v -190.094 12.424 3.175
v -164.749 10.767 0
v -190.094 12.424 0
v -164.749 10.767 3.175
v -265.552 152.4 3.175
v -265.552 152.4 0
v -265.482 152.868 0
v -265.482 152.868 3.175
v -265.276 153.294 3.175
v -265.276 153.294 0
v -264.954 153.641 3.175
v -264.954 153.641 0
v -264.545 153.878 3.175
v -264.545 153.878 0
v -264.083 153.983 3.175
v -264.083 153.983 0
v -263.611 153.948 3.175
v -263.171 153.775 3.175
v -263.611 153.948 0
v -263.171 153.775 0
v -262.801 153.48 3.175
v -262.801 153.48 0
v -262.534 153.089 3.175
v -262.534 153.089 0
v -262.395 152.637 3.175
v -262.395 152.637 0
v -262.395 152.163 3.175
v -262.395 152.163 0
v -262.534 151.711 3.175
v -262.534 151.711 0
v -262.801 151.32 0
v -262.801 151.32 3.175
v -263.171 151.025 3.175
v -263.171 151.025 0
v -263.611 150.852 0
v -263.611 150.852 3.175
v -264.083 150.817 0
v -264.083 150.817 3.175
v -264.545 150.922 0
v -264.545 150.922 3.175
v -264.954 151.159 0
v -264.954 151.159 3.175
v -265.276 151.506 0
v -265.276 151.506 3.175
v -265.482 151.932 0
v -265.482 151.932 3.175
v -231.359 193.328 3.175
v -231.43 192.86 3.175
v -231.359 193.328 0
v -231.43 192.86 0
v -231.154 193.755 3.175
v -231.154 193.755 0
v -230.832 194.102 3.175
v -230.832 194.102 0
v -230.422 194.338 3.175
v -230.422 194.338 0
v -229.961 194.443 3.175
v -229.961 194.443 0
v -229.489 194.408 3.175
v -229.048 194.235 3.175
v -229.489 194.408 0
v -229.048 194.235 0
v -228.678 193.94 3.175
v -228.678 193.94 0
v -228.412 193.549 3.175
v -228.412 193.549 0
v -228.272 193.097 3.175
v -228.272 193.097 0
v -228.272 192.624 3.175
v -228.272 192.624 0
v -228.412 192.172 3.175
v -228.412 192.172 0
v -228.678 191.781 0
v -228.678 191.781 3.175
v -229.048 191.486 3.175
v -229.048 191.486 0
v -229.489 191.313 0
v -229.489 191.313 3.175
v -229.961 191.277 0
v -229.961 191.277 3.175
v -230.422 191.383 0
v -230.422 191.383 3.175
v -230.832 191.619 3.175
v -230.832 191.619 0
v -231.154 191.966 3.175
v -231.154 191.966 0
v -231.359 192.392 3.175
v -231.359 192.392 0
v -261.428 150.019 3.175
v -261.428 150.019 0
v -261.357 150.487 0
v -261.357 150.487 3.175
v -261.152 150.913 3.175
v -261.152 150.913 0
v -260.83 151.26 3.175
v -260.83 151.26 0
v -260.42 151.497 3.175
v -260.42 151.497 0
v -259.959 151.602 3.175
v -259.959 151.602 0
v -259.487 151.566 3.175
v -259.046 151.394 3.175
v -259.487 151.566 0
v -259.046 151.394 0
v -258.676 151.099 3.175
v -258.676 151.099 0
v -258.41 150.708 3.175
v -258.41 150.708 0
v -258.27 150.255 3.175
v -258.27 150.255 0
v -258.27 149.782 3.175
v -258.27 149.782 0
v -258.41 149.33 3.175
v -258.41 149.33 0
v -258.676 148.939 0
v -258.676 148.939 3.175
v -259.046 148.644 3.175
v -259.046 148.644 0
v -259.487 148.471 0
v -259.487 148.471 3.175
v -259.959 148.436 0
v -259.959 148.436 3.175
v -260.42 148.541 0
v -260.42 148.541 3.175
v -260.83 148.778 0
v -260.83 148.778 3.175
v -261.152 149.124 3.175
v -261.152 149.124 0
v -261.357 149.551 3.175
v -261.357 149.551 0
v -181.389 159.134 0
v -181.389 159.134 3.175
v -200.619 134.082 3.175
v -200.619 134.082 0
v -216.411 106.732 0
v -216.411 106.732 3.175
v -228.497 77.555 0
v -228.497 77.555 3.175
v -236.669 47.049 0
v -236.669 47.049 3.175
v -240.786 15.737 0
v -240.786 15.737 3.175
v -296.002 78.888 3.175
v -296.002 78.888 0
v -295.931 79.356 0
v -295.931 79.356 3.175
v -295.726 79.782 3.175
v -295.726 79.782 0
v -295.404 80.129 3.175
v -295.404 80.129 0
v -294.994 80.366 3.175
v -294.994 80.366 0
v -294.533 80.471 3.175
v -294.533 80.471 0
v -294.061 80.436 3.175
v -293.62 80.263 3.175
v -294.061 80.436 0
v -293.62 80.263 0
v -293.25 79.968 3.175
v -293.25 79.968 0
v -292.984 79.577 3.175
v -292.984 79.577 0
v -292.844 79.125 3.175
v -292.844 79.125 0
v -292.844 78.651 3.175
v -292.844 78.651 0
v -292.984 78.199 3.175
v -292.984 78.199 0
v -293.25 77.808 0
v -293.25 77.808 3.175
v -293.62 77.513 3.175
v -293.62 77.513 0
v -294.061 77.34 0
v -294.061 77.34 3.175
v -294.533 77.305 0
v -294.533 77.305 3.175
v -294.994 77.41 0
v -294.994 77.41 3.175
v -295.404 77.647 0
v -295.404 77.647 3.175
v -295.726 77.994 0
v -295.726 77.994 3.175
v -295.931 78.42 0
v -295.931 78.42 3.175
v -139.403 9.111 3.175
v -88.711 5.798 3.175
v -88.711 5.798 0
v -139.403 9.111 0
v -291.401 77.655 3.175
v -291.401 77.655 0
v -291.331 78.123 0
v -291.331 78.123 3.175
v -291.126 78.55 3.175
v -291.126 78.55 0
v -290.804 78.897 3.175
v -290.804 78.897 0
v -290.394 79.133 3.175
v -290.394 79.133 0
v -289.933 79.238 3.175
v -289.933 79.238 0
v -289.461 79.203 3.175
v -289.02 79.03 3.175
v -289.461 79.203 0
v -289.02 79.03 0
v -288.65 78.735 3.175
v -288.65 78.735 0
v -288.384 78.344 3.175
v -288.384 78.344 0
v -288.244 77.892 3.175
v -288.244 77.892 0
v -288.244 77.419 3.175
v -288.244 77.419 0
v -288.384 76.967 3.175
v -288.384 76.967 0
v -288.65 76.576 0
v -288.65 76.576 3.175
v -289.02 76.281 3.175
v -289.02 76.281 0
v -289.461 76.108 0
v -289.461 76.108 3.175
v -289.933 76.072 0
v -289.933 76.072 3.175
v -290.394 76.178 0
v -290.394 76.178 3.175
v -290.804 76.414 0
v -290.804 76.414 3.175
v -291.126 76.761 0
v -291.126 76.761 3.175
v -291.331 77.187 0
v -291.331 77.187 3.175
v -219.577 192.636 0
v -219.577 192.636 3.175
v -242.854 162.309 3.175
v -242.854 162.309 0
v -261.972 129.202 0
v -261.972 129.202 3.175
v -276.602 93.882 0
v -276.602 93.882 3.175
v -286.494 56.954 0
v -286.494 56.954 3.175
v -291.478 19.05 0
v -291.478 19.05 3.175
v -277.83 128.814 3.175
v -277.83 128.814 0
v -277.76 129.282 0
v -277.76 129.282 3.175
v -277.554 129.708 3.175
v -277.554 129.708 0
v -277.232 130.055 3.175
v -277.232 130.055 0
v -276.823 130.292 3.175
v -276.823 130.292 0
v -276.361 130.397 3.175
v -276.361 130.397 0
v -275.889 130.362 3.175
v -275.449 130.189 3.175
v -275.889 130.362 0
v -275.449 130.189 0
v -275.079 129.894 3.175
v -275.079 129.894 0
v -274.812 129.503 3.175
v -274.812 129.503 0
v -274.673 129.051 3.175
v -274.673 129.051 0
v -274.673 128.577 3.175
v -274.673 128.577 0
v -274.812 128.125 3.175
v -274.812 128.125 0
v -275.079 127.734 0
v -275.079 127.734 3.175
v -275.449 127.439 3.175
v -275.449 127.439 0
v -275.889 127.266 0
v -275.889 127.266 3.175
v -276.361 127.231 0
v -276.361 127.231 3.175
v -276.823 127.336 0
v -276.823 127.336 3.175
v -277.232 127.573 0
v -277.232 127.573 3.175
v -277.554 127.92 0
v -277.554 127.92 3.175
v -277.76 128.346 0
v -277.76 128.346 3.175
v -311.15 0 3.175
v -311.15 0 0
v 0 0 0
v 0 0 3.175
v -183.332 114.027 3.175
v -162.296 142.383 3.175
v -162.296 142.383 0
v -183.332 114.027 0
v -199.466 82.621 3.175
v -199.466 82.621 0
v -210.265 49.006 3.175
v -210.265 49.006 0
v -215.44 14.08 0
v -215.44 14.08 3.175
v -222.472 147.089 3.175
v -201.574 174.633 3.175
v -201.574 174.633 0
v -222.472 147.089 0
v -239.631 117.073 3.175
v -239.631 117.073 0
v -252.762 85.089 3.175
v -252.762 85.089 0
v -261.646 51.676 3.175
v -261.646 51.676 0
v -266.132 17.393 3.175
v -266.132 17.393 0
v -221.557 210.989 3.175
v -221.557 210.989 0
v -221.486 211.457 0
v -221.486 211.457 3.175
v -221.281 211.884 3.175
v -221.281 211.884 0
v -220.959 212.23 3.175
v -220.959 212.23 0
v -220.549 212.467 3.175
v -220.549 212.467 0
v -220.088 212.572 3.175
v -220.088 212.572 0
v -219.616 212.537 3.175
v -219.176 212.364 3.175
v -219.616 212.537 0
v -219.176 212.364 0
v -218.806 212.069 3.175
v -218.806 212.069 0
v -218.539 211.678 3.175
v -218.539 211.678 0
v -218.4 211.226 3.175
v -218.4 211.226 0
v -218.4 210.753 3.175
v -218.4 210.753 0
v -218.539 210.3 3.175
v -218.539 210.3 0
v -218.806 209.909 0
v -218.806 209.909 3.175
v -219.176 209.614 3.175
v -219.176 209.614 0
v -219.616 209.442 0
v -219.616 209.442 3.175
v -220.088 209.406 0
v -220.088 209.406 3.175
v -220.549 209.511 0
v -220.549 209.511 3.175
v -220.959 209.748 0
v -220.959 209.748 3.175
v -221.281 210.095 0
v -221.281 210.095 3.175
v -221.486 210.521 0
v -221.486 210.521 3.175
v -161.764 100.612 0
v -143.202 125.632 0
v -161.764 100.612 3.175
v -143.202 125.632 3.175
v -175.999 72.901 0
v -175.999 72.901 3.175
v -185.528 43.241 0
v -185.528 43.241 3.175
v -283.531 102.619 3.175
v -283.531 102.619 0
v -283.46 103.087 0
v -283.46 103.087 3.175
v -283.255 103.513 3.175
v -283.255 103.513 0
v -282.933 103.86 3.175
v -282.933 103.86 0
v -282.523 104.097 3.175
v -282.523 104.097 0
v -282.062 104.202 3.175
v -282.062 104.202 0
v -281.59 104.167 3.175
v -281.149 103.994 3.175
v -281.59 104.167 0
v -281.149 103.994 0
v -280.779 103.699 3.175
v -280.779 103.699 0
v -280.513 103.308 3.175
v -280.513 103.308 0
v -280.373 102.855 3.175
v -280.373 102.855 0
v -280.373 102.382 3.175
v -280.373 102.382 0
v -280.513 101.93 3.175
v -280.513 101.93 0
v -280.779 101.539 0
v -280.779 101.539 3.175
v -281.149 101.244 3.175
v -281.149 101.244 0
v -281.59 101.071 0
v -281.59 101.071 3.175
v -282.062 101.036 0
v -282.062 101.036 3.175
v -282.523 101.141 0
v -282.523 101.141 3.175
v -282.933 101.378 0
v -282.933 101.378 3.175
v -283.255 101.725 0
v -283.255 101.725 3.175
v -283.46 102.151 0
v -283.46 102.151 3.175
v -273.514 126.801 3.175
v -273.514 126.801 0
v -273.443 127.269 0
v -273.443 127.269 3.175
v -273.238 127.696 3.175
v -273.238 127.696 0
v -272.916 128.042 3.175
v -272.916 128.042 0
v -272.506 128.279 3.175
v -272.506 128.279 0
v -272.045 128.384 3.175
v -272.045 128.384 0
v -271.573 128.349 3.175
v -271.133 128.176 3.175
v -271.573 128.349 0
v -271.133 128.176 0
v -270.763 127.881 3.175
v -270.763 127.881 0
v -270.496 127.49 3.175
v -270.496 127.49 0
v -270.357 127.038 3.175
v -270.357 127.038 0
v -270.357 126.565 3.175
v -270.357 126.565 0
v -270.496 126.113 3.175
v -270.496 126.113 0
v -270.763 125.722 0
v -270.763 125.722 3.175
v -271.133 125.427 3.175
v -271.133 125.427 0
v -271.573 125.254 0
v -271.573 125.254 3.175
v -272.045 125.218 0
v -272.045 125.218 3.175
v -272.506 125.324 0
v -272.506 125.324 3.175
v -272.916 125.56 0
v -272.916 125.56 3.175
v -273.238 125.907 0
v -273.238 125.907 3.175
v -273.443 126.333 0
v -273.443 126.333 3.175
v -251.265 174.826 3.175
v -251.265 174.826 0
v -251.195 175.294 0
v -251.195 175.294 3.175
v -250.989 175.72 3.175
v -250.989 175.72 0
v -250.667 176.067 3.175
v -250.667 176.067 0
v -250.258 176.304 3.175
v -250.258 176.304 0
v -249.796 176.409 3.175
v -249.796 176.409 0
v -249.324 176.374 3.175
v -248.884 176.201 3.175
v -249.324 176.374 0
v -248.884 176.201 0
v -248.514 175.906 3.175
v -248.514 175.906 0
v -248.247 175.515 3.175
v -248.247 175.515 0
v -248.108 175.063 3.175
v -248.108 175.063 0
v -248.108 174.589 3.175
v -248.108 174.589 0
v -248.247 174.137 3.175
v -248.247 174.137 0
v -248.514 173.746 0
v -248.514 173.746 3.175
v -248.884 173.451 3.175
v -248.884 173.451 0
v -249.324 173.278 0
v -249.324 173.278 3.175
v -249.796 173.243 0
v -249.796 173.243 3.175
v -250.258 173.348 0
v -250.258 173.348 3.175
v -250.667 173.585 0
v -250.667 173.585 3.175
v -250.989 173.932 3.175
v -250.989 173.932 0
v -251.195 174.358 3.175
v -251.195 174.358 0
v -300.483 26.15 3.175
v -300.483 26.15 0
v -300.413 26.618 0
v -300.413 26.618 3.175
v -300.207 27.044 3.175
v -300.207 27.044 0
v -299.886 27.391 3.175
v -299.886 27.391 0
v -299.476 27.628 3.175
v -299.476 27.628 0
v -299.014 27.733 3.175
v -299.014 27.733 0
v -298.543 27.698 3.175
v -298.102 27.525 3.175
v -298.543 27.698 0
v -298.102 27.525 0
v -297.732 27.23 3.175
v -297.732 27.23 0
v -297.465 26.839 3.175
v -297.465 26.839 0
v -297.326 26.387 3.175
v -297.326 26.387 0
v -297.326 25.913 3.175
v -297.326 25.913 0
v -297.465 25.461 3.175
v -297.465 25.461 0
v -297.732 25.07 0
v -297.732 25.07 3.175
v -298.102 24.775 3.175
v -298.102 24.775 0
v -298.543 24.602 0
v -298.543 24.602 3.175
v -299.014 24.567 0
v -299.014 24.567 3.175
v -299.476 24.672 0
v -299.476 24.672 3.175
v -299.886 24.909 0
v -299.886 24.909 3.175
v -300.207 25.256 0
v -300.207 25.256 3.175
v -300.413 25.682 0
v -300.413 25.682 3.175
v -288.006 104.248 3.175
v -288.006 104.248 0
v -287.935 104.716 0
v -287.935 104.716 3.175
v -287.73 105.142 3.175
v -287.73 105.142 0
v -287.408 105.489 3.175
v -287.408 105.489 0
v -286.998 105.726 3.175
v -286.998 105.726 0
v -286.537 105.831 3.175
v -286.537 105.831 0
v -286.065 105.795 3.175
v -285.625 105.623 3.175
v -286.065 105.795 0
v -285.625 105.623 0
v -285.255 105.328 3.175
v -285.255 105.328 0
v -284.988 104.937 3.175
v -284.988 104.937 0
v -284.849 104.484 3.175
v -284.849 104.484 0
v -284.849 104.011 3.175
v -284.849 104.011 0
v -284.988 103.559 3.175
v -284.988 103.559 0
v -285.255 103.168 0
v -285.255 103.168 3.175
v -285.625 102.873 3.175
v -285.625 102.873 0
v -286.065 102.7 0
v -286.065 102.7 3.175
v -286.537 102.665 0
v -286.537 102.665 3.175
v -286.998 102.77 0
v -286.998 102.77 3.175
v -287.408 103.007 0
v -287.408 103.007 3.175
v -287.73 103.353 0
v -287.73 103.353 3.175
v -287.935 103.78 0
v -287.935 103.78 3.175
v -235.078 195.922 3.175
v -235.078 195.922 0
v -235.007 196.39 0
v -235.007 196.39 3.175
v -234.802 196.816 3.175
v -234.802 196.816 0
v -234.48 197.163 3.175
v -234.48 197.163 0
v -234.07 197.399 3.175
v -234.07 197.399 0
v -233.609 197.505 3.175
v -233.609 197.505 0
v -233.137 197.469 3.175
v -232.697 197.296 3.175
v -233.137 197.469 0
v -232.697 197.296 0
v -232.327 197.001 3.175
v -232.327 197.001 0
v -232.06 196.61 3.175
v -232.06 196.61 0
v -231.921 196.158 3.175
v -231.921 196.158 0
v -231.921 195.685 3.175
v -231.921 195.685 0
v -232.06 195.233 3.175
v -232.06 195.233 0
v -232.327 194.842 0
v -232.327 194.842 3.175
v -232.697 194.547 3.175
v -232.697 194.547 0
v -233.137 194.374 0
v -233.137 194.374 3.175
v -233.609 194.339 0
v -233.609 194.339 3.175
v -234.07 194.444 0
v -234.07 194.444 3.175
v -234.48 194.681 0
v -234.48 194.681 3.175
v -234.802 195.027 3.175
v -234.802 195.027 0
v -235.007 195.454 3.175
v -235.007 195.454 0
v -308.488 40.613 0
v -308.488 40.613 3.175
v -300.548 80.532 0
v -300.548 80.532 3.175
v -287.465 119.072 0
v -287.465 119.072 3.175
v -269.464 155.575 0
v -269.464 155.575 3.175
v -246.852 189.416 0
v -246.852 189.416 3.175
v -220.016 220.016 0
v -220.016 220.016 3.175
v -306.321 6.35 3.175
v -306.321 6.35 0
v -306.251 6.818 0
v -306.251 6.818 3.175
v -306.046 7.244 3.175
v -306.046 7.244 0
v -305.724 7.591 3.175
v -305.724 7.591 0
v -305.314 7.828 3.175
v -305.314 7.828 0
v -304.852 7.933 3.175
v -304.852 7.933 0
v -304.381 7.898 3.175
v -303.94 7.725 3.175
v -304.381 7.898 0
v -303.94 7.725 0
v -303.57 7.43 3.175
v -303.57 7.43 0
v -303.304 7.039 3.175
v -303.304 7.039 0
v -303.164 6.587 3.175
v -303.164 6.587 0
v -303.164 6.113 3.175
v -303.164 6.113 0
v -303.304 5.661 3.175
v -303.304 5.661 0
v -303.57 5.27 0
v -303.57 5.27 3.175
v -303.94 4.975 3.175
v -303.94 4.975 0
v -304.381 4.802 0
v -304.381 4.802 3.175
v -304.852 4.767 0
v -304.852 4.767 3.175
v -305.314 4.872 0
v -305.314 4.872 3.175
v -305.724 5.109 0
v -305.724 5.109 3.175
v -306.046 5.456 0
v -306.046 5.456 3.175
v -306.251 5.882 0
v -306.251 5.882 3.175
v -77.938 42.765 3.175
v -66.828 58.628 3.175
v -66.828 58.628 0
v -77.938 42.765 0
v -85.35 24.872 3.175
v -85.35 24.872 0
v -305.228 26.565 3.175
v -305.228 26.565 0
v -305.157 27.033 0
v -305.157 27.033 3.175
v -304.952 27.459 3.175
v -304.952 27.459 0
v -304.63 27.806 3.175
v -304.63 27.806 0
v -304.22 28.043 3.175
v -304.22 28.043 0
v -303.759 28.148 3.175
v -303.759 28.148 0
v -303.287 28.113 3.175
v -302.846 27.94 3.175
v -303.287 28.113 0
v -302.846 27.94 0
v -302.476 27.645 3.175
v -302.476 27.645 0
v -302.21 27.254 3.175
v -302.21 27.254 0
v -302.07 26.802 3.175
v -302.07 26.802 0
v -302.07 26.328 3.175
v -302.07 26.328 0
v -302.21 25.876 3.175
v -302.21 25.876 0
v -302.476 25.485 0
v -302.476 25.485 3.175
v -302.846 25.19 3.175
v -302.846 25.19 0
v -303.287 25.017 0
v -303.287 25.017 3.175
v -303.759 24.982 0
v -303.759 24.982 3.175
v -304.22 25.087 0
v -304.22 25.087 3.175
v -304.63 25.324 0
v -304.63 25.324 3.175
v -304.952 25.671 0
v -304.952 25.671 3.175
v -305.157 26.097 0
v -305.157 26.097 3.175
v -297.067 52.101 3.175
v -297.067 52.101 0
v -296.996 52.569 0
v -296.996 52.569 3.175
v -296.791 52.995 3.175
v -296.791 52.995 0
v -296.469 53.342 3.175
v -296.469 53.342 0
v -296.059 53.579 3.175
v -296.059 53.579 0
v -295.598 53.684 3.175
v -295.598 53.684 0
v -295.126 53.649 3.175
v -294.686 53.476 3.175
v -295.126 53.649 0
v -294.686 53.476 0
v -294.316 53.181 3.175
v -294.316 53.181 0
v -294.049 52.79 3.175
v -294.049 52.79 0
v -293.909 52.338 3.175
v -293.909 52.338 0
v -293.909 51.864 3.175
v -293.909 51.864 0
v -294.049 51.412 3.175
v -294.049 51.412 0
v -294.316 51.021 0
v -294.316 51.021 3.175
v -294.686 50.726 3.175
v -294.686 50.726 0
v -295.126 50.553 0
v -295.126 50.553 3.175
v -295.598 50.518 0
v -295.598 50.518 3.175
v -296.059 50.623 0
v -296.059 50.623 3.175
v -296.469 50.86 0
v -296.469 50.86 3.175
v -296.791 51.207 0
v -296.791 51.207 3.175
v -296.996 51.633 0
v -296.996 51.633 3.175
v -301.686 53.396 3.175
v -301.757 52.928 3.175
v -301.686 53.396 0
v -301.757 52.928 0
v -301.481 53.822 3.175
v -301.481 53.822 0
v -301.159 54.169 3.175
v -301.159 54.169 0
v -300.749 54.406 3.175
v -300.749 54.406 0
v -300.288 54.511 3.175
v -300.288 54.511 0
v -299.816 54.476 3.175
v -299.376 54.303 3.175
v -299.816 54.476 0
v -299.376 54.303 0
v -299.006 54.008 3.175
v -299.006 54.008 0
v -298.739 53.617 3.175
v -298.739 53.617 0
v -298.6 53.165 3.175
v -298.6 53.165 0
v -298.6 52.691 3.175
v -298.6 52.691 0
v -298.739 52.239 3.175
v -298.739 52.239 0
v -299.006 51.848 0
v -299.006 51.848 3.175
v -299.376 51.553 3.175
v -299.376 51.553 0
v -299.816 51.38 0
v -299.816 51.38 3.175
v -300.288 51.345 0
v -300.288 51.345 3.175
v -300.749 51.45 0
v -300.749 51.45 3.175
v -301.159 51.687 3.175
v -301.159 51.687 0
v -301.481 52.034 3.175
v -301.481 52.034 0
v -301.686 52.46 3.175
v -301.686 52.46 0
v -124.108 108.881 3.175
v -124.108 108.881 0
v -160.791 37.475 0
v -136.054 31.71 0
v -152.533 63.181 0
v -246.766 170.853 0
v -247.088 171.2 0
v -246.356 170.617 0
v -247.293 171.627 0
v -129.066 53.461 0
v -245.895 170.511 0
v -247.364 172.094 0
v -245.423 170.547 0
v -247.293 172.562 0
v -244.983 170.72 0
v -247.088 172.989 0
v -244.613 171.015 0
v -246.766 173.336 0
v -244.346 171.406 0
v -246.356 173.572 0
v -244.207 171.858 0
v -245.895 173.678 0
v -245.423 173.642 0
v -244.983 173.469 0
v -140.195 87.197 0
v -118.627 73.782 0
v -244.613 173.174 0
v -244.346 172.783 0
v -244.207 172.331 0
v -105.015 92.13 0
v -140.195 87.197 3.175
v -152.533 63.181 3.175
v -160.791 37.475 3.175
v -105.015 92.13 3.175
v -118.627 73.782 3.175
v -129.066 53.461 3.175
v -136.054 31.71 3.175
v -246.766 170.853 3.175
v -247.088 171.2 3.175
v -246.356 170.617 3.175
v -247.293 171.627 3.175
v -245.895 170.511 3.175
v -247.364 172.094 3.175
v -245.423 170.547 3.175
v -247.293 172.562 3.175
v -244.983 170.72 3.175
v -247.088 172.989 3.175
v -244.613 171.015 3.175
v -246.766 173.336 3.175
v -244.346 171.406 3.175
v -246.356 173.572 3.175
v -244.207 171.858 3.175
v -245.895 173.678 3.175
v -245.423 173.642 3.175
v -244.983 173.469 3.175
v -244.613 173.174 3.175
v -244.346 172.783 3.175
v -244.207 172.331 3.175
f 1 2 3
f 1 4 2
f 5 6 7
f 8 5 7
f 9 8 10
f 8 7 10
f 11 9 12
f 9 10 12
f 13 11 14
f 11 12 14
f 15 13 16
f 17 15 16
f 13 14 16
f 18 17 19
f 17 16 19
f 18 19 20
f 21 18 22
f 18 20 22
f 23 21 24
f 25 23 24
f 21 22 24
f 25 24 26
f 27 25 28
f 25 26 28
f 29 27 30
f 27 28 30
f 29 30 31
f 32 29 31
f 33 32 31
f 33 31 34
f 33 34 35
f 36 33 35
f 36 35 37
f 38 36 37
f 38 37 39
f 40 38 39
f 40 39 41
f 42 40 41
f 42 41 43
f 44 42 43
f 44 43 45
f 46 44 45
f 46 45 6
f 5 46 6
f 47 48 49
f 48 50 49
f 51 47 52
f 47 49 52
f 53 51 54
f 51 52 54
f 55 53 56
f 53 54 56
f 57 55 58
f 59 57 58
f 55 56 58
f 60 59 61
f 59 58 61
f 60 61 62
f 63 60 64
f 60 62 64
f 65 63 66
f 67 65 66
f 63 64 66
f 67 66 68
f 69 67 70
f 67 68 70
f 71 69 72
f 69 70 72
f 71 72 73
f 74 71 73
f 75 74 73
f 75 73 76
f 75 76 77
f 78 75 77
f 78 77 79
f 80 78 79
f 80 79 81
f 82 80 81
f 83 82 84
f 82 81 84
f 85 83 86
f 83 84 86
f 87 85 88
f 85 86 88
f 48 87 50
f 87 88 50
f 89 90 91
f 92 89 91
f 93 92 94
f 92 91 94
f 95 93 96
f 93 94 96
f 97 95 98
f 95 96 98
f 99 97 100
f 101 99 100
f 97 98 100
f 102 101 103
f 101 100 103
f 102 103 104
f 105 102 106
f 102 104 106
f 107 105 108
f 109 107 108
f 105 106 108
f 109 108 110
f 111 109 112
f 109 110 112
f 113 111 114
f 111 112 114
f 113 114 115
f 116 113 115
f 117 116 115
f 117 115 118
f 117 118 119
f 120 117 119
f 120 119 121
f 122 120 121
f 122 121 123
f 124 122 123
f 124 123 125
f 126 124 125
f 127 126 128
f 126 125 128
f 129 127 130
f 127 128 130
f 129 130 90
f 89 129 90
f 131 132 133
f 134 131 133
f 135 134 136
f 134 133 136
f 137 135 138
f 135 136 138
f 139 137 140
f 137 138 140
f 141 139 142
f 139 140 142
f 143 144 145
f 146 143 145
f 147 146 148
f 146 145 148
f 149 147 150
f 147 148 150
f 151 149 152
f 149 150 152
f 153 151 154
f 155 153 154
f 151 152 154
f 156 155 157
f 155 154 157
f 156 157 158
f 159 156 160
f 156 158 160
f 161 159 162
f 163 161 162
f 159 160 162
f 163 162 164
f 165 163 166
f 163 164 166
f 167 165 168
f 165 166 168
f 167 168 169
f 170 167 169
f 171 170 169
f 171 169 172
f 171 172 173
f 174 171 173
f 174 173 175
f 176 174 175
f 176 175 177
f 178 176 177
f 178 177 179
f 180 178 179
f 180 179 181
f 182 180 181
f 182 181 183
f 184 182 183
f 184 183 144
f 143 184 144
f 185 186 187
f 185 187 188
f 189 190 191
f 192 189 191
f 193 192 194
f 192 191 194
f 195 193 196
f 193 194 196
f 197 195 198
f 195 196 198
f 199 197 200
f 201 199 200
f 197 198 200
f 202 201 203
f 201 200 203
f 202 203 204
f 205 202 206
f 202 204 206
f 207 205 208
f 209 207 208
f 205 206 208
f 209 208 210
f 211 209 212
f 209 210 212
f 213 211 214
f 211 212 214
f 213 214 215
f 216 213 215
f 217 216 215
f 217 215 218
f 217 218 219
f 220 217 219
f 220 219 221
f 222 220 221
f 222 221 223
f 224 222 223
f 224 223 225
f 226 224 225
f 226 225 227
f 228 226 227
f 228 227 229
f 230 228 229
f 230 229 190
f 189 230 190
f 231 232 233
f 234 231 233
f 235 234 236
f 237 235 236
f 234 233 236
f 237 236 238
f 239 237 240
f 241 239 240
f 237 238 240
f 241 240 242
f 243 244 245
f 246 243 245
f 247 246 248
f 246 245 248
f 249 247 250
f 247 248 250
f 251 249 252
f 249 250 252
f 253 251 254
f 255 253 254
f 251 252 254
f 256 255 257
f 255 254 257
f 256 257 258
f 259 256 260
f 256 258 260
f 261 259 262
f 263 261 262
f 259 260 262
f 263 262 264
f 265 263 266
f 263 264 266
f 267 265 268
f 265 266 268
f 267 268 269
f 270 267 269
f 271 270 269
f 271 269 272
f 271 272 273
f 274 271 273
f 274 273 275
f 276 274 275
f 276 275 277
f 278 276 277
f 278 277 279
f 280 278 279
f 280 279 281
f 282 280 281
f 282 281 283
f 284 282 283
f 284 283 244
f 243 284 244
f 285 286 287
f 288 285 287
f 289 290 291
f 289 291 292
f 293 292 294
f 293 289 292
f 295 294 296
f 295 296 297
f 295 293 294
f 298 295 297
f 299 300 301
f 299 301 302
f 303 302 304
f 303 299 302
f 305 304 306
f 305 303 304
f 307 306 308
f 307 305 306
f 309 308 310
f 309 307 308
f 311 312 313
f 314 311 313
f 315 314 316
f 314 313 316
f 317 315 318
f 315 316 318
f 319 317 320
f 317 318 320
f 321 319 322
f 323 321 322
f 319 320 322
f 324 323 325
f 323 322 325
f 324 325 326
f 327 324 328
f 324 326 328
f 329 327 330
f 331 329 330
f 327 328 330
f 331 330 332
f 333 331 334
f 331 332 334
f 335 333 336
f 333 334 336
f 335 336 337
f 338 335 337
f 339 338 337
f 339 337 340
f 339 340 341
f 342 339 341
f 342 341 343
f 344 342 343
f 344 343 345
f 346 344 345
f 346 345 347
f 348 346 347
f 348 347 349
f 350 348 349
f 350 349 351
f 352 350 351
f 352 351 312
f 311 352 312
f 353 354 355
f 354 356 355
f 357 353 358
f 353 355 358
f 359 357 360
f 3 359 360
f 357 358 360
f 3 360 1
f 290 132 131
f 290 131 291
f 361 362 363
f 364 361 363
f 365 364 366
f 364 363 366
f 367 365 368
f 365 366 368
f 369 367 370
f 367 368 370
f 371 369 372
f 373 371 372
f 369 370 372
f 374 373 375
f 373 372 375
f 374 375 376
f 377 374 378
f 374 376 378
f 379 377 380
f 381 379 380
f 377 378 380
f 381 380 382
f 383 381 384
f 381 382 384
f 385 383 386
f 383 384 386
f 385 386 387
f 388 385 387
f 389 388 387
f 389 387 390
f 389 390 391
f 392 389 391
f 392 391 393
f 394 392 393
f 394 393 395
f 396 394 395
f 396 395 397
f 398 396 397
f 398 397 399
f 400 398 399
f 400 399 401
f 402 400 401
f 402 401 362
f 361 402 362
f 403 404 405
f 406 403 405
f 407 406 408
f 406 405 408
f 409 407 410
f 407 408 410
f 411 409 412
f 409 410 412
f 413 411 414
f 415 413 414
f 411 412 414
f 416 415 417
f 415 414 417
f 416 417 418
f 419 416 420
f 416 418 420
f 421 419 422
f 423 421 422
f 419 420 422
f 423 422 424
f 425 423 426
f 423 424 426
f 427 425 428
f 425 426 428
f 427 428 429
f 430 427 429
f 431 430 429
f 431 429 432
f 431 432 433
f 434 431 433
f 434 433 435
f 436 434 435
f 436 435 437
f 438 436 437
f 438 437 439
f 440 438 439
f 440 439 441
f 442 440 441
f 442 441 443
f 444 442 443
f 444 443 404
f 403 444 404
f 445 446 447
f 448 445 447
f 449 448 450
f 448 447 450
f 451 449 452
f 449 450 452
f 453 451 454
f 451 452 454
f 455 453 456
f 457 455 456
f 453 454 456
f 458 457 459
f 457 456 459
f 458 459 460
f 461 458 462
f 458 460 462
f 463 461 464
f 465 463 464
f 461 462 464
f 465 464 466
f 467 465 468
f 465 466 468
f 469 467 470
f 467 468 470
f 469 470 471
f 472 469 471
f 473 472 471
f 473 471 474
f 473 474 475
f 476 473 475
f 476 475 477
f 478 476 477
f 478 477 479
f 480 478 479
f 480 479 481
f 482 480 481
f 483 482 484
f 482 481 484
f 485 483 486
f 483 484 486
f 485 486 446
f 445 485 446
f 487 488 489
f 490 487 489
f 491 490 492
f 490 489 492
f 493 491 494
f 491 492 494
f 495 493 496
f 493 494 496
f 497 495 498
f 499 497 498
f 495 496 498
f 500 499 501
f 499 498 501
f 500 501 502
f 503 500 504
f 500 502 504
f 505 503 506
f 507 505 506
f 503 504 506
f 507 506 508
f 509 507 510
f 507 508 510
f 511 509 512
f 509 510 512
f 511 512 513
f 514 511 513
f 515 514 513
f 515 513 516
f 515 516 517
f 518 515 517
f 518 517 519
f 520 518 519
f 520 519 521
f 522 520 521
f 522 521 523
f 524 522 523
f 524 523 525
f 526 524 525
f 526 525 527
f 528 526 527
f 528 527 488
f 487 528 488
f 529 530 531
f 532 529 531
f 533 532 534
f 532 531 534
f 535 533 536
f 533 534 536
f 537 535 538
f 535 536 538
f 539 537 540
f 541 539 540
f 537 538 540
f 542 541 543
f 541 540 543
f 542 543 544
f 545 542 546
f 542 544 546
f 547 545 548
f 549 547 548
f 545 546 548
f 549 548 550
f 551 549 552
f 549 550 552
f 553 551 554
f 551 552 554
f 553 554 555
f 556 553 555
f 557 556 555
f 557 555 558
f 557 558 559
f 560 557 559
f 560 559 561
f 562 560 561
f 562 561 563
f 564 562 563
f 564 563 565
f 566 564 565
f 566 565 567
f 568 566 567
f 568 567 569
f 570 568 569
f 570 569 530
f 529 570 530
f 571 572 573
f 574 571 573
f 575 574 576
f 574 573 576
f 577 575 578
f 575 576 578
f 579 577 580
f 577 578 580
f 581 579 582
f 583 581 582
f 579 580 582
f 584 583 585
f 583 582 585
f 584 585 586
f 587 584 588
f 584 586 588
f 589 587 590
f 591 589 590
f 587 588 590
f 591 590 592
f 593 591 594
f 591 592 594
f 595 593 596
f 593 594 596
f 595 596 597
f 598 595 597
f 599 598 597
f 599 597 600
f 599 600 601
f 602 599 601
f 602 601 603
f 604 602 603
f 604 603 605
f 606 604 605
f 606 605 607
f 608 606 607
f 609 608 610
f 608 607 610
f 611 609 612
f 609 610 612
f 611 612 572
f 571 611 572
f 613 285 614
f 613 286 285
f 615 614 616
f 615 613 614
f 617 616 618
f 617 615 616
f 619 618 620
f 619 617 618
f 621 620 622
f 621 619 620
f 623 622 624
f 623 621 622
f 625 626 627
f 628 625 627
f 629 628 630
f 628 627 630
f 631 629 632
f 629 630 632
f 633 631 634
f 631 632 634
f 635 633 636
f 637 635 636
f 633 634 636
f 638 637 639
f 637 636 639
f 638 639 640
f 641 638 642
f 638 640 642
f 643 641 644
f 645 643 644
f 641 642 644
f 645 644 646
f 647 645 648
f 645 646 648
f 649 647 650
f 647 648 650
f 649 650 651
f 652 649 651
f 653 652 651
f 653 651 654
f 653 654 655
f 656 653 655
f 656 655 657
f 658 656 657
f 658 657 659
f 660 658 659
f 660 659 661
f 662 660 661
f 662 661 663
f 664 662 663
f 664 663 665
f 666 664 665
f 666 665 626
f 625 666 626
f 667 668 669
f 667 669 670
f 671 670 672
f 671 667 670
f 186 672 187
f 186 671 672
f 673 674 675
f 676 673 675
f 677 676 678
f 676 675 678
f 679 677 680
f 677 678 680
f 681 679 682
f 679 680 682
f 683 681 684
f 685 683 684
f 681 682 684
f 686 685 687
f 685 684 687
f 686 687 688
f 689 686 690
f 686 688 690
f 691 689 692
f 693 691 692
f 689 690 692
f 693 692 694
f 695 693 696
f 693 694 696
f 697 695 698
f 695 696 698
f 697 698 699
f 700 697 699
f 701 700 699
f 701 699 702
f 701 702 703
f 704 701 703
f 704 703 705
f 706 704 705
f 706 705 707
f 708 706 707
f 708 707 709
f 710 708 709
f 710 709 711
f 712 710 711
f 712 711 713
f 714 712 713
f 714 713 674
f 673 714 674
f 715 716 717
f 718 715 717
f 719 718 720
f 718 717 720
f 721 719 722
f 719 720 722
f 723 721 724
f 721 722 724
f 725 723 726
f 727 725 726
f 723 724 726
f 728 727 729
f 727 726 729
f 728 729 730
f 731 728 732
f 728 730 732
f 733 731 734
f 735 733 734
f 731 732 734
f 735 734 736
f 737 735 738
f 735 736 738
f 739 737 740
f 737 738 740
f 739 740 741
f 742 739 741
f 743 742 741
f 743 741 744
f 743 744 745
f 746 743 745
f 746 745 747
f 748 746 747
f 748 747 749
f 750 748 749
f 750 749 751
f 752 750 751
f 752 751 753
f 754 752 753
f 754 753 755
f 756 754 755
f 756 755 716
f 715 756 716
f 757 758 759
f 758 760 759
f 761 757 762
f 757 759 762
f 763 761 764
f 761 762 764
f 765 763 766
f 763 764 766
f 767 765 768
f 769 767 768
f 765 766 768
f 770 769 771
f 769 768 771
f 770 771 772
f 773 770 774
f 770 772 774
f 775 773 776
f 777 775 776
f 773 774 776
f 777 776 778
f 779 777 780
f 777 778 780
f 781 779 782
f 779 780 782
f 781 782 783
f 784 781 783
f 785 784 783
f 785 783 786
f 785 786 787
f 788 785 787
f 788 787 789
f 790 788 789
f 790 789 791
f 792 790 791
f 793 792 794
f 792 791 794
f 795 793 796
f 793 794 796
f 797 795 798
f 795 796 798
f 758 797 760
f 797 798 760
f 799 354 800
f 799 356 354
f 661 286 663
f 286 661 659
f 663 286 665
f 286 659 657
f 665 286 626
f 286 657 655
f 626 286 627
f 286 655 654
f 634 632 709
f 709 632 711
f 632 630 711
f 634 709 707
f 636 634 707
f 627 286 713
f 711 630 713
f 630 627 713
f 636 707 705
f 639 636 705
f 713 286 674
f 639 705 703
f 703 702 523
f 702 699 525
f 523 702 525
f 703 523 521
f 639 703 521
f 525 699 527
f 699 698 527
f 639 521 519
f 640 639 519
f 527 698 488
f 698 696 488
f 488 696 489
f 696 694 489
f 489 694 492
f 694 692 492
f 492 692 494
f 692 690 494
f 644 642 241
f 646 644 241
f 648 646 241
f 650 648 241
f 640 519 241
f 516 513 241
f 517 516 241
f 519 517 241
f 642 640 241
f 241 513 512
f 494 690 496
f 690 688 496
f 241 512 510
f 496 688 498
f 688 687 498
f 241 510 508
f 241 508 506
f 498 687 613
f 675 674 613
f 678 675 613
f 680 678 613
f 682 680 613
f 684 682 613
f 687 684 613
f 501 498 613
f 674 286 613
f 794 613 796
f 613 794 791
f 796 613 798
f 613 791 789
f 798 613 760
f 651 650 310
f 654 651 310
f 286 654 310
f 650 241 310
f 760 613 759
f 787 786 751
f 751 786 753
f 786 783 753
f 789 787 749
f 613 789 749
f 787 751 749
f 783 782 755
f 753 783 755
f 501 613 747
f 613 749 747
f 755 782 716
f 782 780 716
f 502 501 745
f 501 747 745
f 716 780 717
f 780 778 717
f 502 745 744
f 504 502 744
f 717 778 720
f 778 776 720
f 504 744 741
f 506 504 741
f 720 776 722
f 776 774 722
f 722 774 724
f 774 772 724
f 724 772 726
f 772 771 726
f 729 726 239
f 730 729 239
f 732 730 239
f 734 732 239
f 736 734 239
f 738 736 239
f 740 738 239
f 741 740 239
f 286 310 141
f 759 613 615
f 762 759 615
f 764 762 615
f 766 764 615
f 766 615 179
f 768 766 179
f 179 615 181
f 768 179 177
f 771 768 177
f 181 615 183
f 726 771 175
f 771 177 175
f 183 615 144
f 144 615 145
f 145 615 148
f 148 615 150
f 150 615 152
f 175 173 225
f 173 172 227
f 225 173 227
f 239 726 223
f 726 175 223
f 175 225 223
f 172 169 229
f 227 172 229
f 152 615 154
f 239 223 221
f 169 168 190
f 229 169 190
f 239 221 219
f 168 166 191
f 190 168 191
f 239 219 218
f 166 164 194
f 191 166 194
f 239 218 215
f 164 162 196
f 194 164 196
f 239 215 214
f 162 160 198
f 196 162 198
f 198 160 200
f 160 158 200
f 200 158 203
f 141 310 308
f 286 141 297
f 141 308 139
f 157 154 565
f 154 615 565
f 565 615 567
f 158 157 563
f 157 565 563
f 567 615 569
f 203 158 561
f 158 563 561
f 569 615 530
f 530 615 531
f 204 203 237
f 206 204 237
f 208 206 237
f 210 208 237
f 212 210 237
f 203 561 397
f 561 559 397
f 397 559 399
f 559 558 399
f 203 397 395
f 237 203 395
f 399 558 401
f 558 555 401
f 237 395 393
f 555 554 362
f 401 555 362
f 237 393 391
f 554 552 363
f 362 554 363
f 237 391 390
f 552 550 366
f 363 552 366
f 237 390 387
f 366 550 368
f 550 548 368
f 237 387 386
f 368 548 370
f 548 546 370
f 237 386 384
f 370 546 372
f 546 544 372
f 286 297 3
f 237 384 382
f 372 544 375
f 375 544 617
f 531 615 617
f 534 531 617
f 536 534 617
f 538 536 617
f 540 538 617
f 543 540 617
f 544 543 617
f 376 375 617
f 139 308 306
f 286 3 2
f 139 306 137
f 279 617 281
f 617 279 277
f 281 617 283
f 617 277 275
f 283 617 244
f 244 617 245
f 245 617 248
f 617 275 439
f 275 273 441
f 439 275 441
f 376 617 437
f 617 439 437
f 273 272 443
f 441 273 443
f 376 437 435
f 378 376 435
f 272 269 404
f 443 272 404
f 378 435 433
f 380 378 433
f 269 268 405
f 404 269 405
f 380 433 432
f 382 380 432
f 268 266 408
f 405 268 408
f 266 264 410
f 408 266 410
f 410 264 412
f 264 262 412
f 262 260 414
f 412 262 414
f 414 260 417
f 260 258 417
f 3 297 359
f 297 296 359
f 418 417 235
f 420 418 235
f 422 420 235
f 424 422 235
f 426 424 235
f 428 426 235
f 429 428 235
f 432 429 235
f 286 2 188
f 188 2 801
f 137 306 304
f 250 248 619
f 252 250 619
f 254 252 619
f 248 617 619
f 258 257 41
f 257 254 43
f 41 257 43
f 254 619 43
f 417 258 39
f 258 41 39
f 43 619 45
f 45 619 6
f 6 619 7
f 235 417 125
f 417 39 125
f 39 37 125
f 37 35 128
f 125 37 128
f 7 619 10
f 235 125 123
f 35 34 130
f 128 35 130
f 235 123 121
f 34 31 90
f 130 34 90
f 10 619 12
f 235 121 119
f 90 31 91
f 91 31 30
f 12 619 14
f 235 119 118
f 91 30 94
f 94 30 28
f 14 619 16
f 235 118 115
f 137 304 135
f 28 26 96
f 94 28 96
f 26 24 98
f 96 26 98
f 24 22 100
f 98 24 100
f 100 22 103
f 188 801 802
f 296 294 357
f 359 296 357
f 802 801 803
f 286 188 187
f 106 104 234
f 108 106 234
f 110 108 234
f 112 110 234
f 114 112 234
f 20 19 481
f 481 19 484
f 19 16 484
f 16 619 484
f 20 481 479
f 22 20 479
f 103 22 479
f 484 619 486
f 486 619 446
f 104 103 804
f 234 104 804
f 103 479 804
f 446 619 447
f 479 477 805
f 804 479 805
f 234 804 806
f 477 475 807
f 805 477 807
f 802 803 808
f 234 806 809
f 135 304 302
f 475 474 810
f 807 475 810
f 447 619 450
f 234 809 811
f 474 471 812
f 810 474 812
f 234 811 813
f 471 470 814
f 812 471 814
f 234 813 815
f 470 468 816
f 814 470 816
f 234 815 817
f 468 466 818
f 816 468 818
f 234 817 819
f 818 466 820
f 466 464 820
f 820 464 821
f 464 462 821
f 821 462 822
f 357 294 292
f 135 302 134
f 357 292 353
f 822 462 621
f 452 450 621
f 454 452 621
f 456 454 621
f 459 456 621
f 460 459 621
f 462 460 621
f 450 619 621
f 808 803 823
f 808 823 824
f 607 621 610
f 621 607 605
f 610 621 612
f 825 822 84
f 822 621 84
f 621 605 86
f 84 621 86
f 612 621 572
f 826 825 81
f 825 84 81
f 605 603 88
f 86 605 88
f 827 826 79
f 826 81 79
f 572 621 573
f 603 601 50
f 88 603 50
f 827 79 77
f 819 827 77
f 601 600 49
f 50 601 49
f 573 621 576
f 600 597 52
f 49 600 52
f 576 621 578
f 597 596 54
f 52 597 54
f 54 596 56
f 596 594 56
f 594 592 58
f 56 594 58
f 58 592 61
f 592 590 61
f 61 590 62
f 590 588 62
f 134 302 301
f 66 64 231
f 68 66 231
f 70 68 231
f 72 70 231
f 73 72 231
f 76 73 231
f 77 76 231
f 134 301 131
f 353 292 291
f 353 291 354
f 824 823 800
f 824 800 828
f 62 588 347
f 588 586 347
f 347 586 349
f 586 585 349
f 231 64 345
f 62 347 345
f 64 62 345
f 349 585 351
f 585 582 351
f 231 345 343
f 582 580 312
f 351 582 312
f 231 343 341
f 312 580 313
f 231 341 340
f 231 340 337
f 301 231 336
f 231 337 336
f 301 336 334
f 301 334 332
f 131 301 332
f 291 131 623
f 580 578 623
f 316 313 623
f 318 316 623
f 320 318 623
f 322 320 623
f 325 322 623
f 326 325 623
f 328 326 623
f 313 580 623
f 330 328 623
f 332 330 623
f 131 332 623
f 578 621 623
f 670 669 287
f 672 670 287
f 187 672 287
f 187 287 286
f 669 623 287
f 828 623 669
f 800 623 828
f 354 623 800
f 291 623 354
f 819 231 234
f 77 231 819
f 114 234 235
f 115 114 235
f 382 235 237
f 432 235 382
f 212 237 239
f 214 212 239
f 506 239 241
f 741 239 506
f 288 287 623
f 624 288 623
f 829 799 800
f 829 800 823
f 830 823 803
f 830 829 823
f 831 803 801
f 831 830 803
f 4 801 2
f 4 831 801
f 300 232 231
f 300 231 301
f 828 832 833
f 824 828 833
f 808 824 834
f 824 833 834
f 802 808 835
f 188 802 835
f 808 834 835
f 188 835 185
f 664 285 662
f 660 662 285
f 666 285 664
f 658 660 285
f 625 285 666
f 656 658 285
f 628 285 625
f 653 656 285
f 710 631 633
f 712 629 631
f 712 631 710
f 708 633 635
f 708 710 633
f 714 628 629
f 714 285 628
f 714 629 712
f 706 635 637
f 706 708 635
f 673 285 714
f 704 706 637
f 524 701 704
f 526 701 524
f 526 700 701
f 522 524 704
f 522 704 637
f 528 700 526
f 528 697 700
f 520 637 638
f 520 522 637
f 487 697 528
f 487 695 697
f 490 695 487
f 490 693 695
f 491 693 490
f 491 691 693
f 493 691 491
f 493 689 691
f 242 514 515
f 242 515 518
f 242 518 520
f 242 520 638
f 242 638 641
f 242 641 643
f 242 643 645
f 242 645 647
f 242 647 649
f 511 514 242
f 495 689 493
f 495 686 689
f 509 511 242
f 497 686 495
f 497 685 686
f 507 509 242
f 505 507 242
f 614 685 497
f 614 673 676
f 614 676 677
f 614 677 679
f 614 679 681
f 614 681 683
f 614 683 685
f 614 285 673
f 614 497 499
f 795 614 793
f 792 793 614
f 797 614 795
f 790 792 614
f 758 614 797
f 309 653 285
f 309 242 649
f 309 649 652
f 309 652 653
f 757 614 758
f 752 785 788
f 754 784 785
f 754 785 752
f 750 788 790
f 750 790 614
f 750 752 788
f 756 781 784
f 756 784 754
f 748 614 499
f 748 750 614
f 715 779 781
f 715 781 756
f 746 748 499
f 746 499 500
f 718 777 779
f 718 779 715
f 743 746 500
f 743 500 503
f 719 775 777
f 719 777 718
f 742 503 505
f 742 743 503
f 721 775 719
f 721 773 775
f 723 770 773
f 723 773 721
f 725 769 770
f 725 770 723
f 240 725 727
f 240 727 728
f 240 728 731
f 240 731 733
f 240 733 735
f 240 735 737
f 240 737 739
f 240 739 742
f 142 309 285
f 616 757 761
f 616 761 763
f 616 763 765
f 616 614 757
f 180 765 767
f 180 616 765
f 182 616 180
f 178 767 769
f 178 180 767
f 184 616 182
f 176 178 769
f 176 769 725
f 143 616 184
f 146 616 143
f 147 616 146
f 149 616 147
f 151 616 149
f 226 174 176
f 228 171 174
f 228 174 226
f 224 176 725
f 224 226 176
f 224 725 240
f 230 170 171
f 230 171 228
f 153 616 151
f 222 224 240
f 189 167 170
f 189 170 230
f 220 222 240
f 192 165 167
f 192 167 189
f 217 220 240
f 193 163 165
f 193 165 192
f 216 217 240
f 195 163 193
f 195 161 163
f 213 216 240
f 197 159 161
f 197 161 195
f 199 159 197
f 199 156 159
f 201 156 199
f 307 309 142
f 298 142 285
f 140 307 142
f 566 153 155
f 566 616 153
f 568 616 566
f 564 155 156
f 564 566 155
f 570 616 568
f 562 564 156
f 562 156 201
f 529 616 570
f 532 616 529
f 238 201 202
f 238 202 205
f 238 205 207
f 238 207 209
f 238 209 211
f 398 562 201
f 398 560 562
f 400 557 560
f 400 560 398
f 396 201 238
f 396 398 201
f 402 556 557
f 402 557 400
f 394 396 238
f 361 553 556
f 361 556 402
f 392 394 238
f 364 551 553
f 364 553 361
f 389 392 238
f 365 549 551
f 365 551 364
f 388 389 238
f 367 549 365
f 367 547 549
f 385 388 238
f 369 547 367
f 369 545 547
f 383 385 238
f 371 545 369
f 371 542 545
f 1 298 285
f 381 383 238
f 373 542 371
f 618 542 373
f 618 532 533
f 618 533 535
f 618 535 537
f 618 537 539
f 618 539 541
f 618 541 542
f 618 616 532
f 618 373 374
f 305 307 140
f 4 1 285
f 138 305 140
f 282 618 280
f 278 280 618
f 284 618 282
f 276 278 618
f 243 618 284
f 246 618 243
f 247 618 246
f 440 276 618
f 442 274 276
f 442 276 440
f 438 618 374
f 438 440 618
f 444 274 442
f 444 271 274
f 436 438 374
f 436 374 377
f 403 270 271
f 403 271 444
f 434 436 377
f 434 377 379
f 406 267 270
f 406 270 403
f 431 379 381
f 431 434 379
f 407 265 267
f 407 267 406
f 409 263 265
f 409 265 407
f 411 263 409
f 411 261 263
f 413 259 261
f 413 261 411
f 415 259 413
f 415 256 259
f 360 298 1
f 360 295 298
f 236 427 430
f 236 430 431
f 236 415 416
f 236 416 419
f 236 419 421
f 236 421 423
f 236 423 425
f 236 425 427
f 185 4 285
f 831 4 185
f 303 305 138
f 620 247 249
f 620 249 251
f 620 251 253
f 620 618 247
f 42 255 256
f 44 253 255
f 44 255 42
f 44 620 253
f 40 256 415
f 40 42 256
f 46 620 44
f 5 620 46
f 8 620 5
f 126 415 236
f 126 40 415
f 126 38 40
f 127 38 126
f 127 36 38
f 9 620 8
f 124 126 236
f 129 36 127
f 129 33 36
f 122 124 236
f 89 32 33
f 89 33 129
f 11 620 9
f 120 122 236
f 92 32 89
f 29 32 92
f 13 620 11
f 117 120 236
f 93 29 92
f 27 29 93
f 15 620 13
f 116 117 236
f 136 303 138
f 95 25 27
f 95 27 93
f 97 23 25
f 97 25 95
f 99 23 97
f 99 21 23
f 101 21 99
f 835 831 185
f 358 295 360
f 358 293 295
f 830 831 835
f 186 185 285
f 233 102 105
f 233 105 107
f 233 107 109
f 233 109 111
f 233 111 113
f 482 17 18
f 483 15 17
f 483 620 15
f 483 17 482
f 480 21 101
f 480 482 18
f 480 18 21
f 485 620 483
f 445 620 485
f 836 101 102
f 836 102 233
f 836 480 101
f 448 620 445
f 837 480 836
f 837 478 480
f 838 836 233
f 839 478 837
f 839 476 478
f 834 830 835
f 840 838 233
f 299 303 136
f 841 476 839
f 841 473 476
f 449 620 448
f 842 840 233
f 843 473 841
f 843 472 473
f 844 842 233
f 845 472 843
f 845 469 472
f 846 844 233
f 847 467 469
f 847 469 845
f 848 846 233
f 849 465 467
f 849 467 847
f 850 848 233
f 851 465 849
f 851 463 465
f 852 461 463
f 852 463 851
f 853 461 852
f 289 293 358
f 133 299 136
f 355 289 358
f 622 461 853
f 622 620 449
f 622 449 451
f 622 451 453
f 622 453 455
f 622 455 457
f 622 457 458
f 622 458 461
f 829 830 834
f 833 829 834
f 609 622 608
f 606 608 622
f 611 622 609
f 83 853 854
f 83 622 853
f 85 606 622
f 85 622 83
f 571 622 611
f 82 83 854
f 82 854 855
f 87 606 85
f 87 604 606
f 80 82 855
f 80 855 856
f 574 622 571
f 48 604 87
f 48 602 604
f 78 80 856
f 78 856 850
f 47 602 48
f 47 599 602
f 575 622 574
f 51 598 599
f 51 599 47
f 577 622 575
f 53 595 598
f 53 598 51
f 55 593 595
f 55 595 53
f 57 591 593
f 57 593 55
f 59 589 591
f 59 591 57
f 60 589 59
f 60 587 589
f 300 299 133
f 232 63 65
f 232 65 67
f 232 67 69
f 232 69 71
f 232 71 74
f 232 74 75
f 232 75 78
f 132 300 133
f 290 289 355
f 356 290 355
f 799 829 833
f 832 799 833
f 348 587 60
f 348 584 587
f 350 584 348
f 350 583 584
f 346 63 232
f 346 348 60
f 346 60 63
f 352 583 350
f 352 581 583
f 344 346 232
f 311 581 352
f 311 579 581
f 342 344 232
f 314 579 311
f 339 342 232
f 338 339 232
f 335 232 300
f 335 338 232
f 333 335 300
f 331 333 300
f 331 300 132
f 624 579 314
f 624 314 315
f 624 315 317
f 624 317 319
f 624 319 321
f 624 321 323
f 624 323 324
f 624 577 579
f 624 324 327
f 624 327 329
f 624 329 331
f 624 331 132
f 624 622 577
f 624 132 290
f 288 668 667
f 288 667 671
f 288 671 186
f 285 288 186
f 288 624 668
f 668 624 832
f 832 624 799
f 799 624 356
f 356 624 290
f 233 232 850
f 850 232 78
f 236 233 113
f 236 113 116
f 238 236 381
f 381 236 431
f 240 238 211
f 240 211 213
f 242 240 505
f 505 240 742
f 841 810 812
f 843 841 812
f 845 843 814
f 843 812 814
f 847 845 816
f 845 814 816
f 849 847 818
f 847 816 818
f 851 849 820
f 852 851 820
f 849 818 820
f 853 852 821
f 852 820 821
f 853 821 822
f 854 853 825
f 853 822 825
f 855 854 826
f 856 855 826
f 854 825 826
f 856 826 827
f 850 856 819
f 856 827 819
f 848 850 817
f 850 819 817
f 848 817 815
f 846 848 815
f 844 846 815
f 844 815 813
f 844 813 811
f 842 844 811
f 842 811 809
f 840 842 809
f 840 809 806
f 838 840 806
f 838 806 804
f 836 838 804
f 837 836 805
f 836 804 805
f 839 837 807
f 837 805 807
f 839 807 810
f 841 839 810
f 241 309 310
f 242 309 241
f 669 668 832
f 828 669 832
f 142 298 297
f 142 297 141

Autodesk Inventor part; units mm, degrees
ref_plane "YZ Plane" through (0, 0, 0) normal (1, 0, 0) x (0, 1, 0)
ref_plane "XZ Plane" through (0, 0, 0) normal (0, 1, 0) x (-1, 0, 0)
ref_plane "XY Plane" through (0, 0, 0) normal (0, 0, 1) x (1, 0, 0)
sketch "Sketch1" plane through (0, 0, 0) normal (0, 0, 1) x (1, 0, 0)
  arc A0 (-220.016275, 220.016275) -> (-311.15, 0) centre (0, 0) ccw
  line L0 (-311.15, 0) -> (-304.8, 0)
  line L1 (0, 0) -> (-220.016275, 220.016275)
  line L2 (-311.15, 0) -> (0, 0)
extrude "Extrusion1" add sketch "Sketch1" along normal blind 3.175
sketch "Sketch4" plane through (0, 0, 0) normal (0, 0, -1) x (-1, 0, 0)
  arc A0 (311.15, 0) -> (220.016275, 220.016275) centre (0, 0) ccw
  line L0 (220.016275, 220.016275) -> (0, 0)
  line L1 (0, 0) -> (311.15, 0)
  arc A1 (301.625, 0) -> (213.281083, 213.281083) centre (0, 0) ccw
  arc A2 (303.2125, 0) -> (214.403615, 214.403615) centre (0, 0) ccw
  arc A3 (304.8, 0) -> (215.526147, 215.526147) centre (0, 0) ccw construction
  arc A4 (300.0375, 0) -> (212.158551, 212.158551) centre (0, 0) ccw construction
  circle A5 centre (215.526147, 215.526147) radius 1.5875
  circle A6 centre (212.158551, 212.158551) radius 1.5875
  circle A7 centre (233.490346, 195.921663) radius 1.5875
  circle A8 centre (229.84206, 192.860387) radius 1.5875
  circle A9 centre (249.677543, 174.826098) radius 1.5875
  circle A10 centre (245.776331, 172.09444) radius 1.5875
  circle A11 centre (263.964543, 152.4) radius 1.5875
  circle A12 centre (259.840097, 150.01875) radius 1.5875
  circle A13 centre (276.242613, 128.814046) radius 1.5875
  circle A14 centre (271.926323, 126.801327) radius 1.5875
  circle A15 centre (286.418311, 104.24774) radius 1.5875
  circle A16 centre (281.943025, 102.618869) radius 1.5875
  circle A17 centre (294.414192, 78.888045) radius 1.5875
  circle A18 centre (289.81397, 77.655419) radius 1.5875
  circle A19 centre (300.169403, 52.927965) radius 1.5875
  circle A20 centre (295.479256, 52.100965) radius 1.5875
  circle A21 centre (303.640144, 26.56507) radius 1.5875
  circle A22 centre (298.895767, 26.149991) radius 1.5875
  circle A23 centre (304.8, 0) radius 1.5875
  circle A24 centre (300.0375, 0) radius 1.5875
  circle A25 centre (219.969498, 210.989242) radius 1.5875
  circle A26 centre (304.733847, 6.35) radius 1.5875
  point P0 (231.058155, 193.880813)
  point P1 (232.274251, 194.901238)
  point P2 (247.076735, 173.004993)
  point P3 (248.377139, 173.915545)
  point P4 (261.214912, 150.8125)
  point P5 (262.589728, 151.60625)
  point P6 (273.365086, 127.472233)
  point P7 (274.80385, 128.14314)
  point P8 (283.434787, 103.161826)
  point P9 (284.926549, 103.704783)
  point P10 (291.347377, 78.066294)
  point P11 (292.880785, 78.47717)
  point P12 (297.042639, 52.376632)
  point P13 (298.606021, 52.652298)
  point P14 (300.477226, 26.288351)
  point P15 (302.058685, 26.426711)
  point P16 (301.625, 0)
  point P17 (303.2125, 0)
  dimension "d2" = 9.525
  dimension "d3" = 1.5875
  dimension "d4" = 1.5875
  dimension "d5" = 1.5875
  dimension "d8" = 45
  dimension "d10" = 6.35
  dimension "d13" = 3.175
  dimension "d14" = 6.35
sketch "Sketch4 outline for Extrusion2" plane through (0, 0, 0) normal (0, 0, -1) x (-1, 0, 0)
  circle A0 centre (233.490346, 195.921663) radius 1.5875
  circle A1 centre (249.677543, 174.826098) radius 1.5875
  circle A2 centre (263.964543, 152.4) radius 1.5875
  circle A3 centre (276.242613, 128.814046) radius 1.5875
  circle A4 centre (286.418311, 104.24774) radius 1.5875
  circle A5 centre (294.414192, 78.888045) radius 1.5875
  circle A6 centre (300.169403, 52.927965) radius 1.5875
  circle A7 centre (303.640144, 26.56507) radius 1.5875
  circle A8 centre (219.969498, 210.989242) radius 1.5875
  circle A9 centre (304.733847, 6.35) radius 1.5875
  circle A10 centre (229.84206, 192.860387) radius 1.5875
  circle A11 centre (245.776331, 172.09444) radius 1.5875
  circle A12 centre (259.840097, 150.01875) radius 1.5875
  circle A13 centre (271.926323, 126.801327) radius 1.5875
  circle A14 centre (281.943025, 102.618869) radius 1.5875
  circle A15 centre (289.81397, 77.655419) radius 1.5875
  circle A16 centre (295.479256, 52.100965) radius 1.5875
  circle A17 centre (298.895767, 26.149991) radius 1.5875
extrude "Extrusion2" cut sketch "Sketch4 outline for Extrusion2" against normal blind 25.4
sketch "Sketch7" plane through (0, 0, 3.175) normal (0, 0, 1) x (1, 0, 0)
  line L0 (-219.576555, 192.635787) -> (-45.990768, 19.05)
  line L1 (-45.990768, 19.05) -> (-291.478142, 19.05)
  arc A0 (-99.872305, 72.931537) -> (-122.190768, 19.05) centre (-45.990768, 19.05) ccw
  dimension "d29" = 152.4
extrude "Extrusion4" add sketch "Sketch7" against normal blind 3.175
sketch "Sketch9" plane through (0, 0, 3.175) normal (0, 0, 1) x (1, 0, 0)
  arc A0 (-220.016275, 220.016275) -> (-311.15, 0) centre (0, 0) ccw
  line L0 (0, 0) -> (-220.016275, 220.016275)
  arc A1 (-219.576555, 192.635787) -> (-291.478142, 19.05) centre (0, 0) ccw
  arc A2 (-201.574062, 174.633294) -> (-266.132217, 17.393478) centre (0, 0) ccw
  arc A3 (-181.389328, 159.133911) -> (-240.786292, 15.736957) centre (0, 0) ccw
  arc A4 (-162.295715, 142.382973) -> (-215.440366, 14.080435) centre (0, 0) ccw
  arc A5 (-143.202101, 125.632035) -> (-190.094441, 12.423913) centre (0, 0) ccw
  arc A6 (-124.108488, 108.881097) -> (-164.748515, 10.767391) centre (0, 0) ccw
  arc A7 (-105.014874, 92.130159) -> (-139.40259, 9.11087) centre (0, 0) ccw
  arc A8 (-66.827647, 58.628283) -> (-88.710739, 5.797826) centre (0, 0) ccw
  line L1 (-219.576555, 192.635787) -> (-201.574062, 174.633294)
  line L2 (-266.132217, 17.393478) -> (-291.478142, 19.05)
  line L3 (-215.440366, 14.080435) -> (-240.786292, 15.736957)
  line L4 (-88.710739, 5.797826) -> (-139.40259, 9.11087)
  line L5 (-164.748515, 10.767391) -> (-190.094441, 12.423913)
  line L6 (-66.827647, 58.628283) -> (-105.014874, 92.130159)
  line L7 (-143.202101, 125.632035) -> (-124.108488, 108.881097)
  line L8 (-181.389328, 159.133911) -> (-162.295715, 142.382973)
  dimension "d34" = 19.05
  dimension "d35" = 25.4
  dimension "d36" = 25.4
  dimension "d38" = 25.4
  dimension "d39" = 25.4
  dimension "d40" = 25.4
  dimension "d41" = 25.4
extrude "Extrusion5" cut sketch "Sketch9" against normal blind 3.175
properties part number "Side Panel" material "Polycarbonate, Clear"
